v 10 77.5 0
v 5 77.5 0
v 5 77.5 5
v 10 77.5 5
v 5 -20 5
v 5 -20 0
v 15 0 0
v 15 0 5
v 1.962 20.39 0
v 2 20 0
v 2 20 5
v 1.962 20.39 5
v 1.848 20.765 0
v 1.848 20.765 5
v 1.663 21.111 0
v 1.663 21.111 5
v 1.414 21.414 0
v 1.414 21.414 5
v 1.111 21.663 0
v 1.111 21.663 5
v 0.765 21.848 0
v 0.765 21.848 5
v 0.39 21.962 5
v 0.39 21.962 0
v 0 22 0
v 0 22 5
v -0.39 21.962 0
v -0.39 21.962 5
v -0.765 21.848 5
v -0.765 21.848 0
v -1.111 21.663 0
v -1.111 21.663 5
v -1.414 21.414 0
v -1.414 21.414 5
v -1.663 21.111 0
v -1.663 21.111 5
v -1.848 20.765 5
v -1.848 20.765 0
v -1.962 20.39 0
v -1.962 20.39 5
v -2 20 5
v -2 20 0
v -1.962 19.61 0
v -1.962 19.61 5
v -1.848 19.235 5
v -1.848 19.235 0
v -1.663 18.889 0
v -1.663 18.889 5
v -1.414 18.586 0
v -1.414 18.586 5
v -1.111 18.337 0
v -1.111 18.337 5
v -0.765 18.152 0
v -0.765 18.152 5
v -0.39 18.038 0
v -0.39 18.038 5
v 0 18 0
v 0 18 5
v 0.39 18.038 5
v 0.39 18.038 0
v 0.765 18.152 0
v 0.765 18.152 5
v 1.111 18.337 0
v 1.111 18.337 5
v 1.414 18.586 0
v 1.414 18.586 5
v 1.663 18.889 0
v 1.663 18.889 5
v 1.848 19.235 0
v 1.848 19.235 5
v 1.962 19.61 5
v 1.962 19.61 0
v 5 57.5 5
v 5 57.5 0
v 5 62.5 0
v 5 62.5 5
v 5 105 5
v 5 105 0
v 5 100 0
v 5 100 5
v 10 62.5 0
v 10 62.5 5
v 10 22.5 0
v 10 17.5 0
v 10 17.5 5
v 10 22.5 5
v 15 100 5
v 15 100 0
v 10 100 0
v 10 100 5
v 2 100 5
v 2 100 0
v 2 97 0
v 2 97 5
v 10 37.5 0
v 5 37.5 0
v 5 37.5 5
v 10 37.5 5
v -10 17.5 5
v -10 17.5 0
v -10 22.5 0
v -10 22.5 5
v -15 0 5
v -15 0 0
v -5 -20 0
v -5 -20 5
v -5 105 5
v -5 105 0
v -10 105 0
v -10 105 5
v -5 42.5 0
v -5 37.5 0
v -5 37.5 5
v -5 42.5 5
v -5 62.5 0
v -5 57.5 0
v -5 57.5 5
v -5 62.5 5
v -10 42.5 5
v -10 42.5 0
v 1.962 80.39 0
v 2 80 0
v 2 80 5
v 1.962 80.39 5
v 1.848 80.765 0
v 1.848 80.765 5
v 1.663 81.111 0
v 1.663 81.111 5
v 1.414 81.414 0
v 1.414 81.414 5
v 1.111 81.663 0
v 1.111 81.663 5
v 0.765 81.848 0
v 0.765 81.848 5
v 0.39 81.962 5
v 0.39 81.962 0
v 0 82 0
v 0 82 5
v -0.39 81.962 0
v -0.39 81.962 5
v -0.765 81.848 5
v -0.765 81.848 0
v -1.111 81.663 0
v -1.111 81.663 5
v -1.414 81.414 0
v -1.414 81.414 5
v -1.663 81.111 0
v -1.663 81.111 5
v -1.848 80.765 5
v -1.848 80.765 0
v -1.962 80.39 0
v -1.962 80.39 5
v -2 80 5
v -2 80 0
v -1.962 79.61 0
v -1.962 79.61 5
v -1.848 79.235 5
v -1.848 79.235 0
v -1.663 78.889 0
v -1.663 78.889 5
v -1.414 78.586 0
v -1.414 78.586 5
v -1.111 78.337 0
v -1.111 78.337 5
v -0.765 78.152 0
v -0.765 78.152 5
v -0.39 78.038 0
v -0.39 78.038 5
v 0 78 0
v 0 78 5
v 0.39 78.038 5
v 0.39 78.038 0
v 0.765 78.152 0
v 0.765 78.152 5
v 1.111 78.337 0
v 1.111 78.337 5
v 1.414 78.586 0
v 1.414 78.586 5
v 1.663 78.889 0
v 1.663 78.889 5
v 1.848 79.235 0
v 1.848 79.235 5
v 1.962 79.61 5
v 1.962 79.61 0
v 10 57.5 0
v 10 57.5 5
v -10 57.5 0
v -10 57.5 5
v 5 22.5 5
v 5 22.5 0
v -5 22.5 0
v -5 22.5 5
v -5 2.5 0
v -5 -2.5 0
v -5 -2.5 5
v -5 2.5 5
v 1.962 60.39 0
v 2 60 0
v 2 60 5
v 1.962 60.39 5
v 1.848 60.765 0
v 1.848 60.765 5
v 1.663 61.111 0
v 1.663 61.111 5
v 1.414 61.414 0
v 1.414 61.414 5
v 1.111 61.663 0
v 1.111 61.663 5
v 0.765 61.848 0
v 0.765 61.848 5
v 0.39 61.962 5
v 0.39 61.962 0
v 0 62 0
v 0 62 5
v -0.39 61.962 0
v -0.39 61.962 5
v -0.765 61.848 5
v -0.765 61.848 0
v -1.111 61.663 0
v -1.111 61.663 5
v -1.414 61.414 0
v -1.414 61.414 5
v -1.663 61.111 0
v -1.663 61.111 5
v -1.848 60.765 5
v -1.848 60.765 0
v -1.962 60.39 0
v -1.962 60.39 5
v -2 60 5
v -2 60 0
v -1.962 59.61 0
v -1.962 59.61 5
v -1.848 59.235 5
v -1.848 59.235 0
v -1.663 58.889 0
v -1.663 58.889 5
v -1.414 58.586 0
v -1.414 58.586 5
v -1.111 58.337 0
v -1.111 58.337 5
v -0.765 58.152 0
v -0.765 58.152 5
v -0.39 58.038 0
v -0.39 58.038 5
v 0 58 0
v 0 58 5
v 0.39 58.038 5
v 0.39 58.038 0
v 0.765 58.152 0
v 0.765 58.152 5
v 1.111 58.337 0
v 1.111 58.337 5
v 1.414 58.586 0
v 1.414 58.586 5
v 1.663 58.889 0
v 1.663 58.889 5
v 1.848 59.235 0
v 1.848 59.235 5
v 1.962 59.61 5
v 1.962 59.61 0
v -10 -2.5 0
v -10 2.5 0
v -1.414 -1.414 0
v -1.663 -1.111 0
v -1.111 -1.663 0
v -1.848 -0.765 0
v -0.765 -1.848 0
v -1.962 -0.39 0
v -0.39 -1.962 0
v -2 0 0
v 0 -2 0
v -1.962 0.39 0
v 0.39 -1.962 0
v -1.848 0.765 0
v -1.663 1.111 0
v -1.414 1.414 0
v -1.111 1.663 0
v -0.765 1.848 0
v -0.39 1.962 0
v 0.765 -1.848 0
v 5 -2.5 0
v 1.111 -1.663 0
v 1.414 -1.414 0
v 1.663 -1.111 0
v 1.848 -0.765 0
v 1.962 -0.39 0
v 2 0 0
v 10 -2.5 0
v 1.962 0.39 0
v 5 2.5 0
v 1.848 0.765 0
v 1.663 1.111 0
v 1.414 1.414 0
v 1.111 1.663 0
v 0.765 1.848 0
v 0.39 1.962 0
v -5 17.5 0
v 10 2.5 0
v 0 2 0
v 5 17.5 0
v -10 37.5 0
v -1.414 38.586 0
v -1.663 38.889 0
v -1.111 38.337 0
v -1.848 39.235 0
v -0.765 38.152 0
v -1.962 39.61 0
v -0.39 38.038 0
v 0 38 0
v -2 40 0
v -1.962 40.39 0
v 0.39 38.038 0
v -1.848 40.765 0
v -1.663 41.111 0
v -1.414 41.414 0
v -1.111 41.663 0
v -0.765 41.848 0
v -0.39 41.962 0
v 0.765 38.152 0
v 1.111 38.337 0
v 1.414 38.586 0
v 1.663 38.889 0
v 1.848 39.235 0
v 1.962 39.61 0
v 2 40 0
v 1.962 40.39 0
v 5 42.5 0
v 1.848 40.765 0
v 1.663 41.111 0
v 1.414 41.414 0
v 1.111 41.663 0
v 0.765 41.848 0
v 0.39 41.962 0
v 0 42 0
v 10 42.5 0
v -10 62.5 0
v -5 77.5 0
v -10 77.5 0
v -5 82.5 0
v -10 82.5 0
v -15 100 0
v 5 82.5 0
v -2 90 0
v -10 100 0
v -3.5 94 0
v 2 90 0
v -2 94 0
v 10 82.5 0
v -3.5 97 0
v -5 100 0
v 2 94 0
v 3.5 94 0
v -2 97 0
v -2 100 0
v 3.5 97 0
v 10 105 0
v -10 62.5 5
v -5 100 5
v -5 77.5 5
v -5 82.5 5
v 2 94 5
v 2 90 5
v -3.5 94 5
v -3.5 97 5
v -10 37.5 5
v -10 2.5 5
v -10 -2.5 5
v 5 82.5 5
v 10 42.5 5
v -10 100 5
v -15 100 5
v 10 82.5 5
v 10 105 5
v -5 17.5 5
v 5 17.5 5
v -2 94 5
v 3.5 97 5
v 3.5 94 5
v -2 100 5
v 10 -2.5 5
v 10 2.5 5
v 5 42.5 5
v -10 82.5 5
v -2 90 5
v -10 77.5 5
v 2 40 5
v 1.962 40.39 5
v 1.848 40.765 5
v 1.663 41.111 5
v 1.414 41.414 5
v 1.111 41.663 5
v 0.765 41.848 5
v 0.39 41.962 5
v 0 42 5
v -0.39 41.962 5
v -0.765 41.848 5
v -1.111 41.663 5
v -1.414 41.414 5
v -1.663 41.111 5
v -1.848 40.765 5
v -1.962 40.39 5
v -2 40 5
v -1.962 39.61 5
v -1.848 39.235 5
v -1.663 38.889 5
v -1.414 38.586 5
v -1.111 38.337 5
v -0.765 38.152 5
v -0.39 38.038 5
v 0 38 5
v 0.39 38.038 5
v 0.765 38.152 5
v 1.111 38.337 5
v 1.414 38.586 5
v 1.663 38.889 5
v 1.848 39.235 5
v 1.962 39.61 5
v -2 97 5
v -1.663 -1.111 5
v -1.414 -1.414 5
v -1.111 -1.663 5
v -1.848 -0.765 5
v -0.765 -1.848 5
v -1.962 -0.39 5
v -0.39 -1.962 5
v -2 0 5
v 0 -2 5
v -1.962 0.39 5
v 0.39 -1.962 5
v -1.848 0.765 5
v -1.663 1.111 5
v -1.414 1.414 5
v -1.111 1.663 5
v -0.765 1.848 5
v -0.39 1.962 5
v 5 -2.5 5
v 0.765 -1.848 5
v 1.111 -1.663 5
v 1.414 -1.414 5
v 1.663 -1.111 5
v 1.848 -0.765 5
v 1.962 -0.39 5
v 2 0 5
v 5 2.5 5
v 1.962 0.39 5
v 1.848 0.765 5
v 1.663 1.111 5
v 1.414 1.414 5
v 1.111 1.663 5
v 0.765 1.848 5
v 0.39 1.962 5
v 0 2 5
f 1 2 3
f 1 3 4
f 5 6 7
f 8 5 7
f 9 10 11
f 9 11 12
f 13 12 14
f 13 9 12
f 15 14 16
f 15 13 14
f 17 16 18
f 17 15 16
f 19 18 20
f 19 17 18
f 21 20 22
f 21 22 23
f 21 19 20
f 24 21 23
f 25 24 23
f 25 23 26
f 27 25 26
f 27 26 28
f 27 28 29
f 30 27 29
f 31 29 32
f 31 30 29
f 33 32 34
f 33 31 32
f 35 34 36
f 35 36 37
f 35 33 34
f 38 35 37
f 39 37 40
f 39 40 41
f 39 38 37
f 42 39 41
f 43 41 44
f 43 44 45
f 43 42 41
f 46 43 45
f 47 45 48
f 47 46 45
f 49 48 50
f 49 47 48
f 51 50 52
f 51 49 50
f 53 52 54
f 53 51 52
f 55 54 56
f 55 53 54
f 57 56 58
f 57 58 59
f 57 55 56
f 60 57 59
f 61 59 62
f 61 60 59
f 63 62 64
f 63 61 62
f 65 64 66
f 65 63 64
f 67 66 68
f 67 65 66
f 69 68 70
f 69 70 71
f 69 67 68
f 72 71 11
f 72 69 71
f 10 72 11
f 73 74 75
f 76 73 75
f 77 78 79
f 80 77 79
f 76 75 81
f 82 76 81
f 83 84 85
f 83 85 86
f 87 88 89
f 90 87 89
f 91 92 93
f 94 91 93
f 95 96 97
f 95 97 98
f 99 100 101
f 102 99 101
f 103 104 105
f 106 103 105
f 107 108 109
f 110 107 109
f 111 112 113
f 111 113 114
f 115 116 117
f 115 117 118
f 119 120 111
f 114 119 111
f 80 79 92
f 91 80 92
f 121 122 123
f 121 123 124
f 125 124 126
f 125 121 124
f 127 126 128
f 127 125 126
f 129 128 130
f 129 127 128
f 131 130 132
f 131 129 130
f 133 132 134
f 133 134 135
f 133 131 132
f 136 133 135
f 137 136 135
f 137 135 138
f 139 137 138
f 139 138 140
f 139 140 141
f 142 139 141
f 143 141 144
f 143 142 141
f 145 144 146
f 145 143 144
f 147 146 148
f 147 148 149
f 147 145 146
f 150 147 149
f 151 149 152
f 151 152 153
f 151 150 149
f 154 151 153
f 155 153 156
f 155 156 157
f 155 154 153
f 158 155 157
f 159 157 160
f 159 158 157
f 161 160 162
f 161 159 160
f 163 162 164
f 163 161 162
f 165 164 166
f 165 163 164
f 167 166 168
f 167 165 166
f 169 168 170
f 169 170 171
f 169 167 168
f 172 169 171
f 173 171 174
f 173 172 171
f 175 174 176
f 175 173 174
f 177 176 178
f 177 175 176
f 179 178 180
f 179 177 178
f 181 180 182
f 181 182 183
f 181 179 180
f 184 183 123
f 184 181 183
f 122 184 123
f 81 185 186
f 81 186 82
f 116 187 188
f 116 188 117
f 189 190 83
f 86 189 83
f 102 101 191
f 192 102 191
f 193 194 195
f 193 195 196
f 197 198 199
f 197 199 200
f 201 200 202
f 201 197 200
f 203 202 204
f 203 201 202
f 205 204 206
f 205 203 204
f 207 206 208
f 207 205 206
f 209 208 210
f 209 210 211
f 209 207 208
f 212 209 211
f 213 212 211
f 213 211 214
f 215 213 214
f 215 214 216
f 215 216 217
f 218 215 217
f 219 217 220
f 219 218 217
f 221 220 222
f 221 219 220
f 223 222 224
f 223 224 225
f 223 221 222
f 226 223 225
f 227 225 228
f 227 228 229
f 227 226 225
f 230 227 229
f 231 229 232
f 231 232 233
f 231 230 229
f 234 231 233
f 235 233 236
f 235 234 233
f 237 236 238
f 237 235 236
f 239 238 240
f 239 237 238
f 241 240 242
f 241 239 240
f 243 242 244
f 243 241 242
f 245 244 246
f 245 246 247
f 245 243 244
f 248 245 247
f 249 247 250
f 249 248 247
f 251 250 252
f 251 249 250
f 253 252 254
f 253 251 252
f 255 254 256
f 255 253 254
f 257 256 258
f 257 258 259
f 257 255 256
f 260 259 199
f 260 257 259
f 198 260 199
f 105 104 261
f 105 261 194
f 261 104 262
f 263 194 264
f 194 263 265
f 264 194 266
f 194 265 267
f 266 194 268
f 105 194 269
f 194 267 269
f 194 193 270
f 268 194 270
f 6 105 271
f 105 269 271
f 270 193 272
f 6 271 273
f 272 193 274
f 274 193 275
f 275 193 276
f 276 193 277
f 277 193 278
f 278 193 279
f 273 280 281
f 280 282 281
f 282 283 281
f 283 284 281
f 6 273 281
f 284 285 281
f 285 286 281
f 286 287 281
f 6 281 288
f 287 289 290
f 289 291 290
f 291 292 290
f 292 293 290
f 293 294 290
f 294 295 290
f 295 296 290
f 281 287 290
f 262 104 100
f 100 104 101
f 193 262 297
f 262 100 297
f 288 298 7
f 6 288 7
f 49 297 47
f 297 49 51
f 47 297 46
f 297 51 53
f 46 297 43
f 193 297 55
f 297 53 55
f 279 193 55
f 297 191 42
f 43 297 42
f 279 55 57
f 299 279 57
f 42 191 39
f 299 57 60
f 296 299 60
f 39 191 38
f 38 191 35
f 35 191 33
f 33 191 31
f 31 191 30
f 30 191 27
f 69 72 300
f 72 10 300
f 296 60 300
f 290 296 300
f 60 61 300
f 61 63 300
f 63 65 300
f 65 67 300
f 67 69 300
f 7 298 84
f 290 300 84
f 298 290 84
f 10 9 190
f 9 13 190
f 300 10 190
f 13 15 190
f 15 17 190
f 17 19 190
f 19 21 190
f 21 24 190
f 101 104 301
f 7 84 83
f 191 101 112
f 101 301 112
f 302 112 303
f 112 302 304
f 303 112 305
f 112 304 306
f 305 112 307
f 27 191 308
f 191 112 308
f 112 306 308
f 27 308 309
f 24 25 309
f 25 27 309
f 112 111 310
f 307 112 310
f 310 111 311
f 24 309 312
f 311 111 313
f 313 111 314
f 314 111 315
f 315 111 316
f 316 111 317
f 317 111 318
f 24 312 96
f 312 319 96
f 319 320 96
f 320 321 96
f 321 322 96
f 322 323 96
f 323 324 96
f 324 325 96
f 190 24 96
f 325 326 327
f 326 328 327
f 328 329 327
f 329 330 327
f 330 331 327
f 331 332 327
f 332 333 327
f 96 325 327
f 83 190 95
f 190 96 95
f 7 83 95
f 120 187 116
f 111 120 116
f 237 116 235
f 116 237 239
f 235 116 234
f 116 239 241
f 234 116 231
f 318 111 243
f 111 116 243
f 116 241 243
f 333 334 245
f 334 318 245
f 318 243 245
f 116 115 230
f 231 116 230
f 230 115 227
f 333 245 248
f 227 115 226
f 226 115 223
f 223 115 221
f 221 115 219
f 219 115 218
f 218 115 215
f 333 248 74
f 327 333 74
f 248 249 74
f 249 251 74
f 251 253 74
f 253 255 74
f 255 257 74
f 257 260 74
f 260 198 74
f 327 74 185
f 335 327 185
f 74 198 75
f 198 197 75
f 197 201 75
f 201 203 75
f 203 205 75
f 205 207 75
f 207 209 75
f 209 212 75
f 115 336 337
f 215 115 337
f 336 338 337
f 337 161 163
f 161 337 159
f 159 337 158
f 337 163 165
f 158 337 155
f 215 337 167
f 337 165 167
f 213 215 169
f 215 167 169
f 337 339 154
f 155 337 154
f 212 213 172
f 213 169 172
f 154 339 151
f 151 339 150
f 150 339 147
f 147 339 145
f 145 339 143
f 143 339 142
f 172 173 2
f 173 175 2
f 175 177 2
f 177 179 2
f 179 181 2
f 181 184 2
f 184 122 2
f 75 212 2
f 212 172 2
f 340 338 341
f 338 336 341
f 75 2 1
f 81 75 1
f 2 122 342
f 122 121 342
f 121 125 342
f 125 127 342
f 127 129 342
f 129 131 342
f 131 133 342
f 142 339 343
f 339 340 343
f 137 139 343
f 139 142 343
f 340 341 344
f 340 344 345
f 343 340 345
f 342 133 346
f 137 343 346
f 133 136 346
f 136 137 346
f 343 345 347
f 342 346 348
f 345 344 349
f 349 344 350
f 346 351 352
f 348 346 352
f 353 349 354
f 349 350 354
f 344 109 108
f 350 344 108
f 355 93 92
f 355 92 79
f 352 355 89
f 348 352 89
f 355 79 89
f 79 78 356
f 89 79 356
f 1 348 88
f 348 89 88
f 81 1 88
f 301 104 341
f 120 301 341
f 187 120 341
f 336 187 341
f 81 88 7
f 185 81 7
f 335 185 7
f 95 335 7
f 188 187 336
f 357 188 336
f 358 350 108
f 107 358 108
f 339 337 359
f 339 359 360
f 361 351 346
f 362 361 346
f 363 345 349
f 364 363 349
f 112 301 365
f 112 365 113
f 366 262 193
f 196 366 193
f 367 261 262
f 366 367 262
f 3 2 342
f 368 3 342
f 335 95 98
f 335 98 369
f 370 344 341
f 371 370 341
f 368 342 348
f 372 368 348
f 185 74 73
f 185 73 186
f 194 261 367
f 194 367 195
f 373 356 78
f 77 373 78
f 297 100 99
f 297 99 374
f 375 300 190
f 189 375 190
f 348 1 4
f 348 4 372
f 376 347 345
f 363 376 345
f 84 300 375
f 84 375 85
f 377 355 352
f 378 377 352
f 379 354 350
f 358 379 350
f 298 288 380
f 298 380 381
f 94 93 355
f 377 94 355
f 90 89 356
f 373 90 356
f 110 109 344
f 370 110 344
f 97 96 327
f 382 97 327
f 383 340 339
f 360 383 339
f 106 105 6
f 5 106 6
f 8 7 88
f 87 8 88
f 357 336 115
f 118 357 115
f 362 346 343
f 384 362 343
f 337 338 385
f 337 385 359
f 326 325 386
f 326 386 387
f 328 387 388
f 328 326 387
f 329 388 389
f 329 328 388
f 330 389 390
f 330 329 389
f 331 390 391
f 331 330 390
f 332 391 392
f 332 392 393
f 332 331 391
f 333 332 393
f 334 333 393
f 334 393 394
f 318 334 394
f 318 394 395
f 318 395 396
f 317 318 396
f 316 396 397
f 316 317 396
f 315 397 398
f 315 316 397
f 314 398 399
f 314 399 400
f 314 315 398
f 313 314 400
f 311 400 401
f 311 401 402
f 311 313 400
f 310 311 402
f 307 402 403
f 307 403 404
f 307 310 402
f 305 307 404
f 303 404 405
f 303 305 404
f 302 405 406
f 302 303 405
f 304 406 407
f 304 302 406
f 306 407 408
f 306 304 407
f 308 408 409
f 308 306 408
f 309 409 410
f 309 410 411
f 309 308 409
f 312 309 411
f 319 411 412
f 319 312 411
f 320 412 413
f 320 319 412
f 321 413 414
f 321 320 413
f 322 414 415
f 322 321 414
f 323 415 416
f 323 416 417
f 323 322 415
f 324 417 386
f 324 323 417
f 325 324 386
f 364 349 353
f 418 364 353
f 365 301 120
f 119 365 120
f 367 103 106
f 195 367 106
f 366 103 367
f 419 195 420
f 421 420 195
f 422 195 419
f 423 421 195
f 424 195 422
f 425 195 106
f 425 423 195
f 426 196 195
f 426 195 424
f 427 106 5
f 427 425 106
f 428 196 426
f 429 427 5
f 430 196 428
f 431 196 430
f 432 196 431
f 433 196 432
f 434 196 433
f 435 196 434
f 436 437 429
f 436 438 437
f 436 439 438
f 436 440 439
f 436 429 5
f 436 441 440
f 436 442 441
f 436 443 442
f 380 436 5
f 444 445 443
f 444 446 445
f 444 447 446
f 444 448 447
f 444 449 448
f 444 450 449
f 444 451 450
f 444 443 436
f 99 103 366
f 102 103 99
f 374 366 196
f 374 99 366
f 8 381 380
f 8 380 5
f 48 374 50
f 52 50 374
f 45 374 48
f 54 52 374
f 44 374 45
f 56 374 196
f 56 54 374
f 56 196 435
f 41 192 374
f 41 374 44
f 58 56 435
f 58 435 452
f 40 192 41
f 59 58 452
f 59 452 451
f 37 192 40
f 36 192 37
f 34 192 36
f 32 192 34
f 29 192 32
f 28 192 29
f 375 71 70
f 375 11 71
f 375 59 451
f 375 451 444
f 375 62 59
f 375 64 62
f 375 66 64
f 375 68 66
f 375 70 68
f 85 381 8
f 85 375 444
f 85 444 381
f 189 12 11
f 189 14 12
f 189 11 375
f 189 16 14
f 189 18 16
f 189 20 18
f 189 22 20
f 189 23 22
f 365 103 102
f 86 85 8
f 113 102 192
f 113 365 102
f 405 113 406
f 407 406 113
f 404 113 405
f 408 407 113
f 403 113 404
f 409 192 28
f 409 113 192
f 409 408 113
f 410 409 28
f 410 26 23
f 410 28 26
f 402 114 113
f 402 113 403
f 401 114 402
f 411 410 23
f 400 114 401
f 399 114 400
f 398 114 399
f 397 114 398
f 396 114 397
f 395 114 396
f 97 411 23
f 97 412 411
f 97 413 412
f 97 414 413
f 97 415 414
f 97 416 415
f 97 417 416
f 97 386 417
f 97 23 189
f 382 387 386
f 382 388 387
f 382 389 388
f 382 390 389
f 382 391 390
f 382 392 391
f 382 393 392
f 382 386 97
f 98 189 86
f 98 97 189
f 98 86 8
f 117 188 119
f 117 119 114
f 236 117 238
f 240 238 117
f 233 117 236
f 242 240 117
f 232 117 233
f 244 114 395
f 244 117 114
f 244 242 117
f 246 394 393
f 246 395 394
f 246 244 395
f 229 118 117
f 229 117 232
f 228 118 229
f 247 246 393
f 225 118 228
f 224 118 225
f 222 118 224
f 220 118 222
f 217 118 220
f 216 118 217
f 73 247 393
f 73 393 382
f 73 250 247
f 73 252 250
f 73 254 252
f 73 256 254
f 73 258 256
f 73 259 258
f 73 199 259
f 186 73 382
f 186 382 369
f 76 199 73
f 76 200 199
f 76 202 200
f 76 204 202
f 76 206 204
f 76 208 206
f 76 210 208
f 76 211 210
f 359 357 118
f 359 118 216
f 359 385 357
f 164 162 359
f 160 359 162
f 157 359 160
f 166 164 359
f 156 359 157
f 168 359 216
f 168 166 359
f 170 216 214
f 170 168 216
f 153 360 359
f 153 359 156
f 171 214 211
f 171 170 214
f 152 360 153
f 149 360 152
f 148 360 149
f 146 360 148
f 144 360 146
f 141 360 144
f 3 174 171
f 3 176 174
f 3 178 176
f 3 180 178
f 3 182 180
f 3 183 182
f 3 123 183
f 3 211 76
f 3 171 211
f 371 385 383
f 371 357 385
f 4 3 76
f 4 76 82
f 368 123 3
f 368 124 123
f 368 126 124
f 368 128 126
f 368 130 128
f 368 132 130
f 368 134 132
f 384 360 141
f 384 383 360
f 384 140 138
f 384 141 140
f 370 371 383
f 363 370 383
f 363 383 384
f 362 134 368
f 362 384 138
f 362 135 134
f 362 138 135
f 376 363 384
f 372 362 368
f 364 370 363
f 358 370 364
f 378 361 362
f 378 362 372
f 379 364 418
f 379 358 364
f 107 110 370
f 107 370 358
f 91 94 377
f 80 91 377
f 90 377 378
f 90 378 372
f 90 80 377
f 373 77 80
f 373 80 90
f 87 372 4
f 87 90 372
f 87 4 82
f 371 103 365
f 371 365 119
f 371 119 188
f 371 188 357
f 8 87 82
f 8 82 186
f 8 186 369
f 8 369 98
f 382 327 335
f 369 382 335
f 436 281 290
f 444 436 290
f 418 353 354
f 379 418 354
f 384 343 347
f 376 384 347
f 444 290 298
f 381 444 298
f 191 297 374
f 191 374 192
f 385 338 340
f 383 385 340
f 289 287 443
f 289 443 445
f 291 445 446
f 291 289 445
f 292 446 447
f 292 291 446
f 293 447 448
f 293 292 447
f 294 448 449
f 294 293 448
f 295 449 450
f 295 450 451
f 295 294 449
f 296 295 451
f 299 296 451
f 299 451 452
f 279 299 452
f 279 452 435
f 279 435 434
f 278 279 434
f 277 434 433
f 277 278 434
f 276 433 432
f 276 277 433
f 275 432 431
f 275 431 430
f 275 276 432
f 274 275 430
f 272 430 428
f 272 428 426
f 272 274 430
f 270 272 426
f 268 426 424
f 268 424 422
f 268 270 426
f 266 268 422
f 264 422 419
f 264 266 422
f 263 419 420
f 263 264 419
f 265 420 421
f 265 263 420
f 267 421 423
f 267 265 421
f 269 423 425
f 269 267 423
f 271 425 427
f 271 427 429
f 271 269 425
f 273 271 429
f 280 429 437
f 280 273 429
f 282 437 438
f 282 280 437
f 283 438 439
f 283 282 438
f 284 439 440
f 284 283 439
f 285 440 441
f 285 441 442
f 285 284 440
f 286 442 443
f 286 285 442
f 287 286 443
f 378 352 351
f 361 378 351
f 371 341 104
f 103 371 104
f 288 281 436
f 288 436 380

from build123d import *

# Parameters (mm, degrees)
ESQUISSE1_R        = 2
ESQUISSE1_W        = 5
ESQUISSE1_H        = 5
BOSS_EXTRU_1_DEPTH = 5


with BuildPart() as part:
    # Esquisse1 → Boss.-Extru.1 (new body)
    with BuildSketch(Plane.XY):
        Polygon((-10, 100), (-15, 100), (-15, 0), (-5, -20), (5, -20), (15, 0), (15, 100), (10, 100), (10, 105), (5, 105), (5, 100), (2, 100), (2, 97), (3.5, 97), (3.5, 94), (2, 94), (2, 90), (-2, 90), (-2, 94), (-3.5, 94), (-3.5, 97), (-2, 97), (-2, 100), (-5, 100), (-5, 105), (-10, 105), align=None)
        with Locations((0, 40)):
            Circle(ESQUISSE1_R, mode=Mode.SUBTRACT)
        with Locations((0, 20)):
            Circle(ESQUISSE1_R, mode=Mode.SUBTRACT)
        Circle(ESQUISSE1_R, mode=Mode.SUBTRACT)
        with Locations((0, 60)):
            Circle(ESQUISSE1_R, mode=Mode.SUBTRACT)
        with Locations((0, 80)):
            Circle(ESQUISSE1_R, mode=Mode.SUBTRACT)
        with Locations((-7.5, 40)):
            Rectangle(ESQUISSE1_W, ESQUISSE1_H, mode=Mode.SUBTRACT)
        with Locations((7.5, 40)):
            Rectangle(ESQUISSE1_W, ESQUISSE1_H, mode=Mode.SUBTRACT)
        with Locations((-7.5, 20)):
            Rectangle(ESQUISSE1_W, ESQUISSE1_H, mode=Mode.SUBTRACT)
        with Locations((7.5, 20)):
            Rectangle(ESQUISSE1_W, ESQUISSE1_H, mode=Mode.SUBTRACT)
        with Locations((-7.5, 0)):
            Rectangle(ESQUISSE1_W, ESQUISSE1_H, mode=Mode.SUBTRACT)
        with Locations((7.5, 0)):
            Rectangle(ESQUISSE1_W, ESQUISSE1_H, mode=Mode.SUBTRACT)
        with Locations((-7.5, 60)):
            Rectangle(ESQUISSE1_W, ESQUISSE1_H, mode=Mode.SUBTRACT)
        with Locations((7.5, 60)):
            Rectangle(ESQUISSE1_W, ESQUISSE1_H, mode=Mode.SUBTRACT)
        with Locations((-7.5, 80)):
            Rectangle(ESQUISSE1_W, ESQUISSE1_H, mode=Mode.SUBTRACT)
        with Locations((7.5, 80)):
            Rectangle(ESQUISSE1_W, ESQUISSE1_H, mode=Mode.SUBTRACT)
    extrude(amount=BOSS_EXTRU_1_DEPTH)


solid = part.part
